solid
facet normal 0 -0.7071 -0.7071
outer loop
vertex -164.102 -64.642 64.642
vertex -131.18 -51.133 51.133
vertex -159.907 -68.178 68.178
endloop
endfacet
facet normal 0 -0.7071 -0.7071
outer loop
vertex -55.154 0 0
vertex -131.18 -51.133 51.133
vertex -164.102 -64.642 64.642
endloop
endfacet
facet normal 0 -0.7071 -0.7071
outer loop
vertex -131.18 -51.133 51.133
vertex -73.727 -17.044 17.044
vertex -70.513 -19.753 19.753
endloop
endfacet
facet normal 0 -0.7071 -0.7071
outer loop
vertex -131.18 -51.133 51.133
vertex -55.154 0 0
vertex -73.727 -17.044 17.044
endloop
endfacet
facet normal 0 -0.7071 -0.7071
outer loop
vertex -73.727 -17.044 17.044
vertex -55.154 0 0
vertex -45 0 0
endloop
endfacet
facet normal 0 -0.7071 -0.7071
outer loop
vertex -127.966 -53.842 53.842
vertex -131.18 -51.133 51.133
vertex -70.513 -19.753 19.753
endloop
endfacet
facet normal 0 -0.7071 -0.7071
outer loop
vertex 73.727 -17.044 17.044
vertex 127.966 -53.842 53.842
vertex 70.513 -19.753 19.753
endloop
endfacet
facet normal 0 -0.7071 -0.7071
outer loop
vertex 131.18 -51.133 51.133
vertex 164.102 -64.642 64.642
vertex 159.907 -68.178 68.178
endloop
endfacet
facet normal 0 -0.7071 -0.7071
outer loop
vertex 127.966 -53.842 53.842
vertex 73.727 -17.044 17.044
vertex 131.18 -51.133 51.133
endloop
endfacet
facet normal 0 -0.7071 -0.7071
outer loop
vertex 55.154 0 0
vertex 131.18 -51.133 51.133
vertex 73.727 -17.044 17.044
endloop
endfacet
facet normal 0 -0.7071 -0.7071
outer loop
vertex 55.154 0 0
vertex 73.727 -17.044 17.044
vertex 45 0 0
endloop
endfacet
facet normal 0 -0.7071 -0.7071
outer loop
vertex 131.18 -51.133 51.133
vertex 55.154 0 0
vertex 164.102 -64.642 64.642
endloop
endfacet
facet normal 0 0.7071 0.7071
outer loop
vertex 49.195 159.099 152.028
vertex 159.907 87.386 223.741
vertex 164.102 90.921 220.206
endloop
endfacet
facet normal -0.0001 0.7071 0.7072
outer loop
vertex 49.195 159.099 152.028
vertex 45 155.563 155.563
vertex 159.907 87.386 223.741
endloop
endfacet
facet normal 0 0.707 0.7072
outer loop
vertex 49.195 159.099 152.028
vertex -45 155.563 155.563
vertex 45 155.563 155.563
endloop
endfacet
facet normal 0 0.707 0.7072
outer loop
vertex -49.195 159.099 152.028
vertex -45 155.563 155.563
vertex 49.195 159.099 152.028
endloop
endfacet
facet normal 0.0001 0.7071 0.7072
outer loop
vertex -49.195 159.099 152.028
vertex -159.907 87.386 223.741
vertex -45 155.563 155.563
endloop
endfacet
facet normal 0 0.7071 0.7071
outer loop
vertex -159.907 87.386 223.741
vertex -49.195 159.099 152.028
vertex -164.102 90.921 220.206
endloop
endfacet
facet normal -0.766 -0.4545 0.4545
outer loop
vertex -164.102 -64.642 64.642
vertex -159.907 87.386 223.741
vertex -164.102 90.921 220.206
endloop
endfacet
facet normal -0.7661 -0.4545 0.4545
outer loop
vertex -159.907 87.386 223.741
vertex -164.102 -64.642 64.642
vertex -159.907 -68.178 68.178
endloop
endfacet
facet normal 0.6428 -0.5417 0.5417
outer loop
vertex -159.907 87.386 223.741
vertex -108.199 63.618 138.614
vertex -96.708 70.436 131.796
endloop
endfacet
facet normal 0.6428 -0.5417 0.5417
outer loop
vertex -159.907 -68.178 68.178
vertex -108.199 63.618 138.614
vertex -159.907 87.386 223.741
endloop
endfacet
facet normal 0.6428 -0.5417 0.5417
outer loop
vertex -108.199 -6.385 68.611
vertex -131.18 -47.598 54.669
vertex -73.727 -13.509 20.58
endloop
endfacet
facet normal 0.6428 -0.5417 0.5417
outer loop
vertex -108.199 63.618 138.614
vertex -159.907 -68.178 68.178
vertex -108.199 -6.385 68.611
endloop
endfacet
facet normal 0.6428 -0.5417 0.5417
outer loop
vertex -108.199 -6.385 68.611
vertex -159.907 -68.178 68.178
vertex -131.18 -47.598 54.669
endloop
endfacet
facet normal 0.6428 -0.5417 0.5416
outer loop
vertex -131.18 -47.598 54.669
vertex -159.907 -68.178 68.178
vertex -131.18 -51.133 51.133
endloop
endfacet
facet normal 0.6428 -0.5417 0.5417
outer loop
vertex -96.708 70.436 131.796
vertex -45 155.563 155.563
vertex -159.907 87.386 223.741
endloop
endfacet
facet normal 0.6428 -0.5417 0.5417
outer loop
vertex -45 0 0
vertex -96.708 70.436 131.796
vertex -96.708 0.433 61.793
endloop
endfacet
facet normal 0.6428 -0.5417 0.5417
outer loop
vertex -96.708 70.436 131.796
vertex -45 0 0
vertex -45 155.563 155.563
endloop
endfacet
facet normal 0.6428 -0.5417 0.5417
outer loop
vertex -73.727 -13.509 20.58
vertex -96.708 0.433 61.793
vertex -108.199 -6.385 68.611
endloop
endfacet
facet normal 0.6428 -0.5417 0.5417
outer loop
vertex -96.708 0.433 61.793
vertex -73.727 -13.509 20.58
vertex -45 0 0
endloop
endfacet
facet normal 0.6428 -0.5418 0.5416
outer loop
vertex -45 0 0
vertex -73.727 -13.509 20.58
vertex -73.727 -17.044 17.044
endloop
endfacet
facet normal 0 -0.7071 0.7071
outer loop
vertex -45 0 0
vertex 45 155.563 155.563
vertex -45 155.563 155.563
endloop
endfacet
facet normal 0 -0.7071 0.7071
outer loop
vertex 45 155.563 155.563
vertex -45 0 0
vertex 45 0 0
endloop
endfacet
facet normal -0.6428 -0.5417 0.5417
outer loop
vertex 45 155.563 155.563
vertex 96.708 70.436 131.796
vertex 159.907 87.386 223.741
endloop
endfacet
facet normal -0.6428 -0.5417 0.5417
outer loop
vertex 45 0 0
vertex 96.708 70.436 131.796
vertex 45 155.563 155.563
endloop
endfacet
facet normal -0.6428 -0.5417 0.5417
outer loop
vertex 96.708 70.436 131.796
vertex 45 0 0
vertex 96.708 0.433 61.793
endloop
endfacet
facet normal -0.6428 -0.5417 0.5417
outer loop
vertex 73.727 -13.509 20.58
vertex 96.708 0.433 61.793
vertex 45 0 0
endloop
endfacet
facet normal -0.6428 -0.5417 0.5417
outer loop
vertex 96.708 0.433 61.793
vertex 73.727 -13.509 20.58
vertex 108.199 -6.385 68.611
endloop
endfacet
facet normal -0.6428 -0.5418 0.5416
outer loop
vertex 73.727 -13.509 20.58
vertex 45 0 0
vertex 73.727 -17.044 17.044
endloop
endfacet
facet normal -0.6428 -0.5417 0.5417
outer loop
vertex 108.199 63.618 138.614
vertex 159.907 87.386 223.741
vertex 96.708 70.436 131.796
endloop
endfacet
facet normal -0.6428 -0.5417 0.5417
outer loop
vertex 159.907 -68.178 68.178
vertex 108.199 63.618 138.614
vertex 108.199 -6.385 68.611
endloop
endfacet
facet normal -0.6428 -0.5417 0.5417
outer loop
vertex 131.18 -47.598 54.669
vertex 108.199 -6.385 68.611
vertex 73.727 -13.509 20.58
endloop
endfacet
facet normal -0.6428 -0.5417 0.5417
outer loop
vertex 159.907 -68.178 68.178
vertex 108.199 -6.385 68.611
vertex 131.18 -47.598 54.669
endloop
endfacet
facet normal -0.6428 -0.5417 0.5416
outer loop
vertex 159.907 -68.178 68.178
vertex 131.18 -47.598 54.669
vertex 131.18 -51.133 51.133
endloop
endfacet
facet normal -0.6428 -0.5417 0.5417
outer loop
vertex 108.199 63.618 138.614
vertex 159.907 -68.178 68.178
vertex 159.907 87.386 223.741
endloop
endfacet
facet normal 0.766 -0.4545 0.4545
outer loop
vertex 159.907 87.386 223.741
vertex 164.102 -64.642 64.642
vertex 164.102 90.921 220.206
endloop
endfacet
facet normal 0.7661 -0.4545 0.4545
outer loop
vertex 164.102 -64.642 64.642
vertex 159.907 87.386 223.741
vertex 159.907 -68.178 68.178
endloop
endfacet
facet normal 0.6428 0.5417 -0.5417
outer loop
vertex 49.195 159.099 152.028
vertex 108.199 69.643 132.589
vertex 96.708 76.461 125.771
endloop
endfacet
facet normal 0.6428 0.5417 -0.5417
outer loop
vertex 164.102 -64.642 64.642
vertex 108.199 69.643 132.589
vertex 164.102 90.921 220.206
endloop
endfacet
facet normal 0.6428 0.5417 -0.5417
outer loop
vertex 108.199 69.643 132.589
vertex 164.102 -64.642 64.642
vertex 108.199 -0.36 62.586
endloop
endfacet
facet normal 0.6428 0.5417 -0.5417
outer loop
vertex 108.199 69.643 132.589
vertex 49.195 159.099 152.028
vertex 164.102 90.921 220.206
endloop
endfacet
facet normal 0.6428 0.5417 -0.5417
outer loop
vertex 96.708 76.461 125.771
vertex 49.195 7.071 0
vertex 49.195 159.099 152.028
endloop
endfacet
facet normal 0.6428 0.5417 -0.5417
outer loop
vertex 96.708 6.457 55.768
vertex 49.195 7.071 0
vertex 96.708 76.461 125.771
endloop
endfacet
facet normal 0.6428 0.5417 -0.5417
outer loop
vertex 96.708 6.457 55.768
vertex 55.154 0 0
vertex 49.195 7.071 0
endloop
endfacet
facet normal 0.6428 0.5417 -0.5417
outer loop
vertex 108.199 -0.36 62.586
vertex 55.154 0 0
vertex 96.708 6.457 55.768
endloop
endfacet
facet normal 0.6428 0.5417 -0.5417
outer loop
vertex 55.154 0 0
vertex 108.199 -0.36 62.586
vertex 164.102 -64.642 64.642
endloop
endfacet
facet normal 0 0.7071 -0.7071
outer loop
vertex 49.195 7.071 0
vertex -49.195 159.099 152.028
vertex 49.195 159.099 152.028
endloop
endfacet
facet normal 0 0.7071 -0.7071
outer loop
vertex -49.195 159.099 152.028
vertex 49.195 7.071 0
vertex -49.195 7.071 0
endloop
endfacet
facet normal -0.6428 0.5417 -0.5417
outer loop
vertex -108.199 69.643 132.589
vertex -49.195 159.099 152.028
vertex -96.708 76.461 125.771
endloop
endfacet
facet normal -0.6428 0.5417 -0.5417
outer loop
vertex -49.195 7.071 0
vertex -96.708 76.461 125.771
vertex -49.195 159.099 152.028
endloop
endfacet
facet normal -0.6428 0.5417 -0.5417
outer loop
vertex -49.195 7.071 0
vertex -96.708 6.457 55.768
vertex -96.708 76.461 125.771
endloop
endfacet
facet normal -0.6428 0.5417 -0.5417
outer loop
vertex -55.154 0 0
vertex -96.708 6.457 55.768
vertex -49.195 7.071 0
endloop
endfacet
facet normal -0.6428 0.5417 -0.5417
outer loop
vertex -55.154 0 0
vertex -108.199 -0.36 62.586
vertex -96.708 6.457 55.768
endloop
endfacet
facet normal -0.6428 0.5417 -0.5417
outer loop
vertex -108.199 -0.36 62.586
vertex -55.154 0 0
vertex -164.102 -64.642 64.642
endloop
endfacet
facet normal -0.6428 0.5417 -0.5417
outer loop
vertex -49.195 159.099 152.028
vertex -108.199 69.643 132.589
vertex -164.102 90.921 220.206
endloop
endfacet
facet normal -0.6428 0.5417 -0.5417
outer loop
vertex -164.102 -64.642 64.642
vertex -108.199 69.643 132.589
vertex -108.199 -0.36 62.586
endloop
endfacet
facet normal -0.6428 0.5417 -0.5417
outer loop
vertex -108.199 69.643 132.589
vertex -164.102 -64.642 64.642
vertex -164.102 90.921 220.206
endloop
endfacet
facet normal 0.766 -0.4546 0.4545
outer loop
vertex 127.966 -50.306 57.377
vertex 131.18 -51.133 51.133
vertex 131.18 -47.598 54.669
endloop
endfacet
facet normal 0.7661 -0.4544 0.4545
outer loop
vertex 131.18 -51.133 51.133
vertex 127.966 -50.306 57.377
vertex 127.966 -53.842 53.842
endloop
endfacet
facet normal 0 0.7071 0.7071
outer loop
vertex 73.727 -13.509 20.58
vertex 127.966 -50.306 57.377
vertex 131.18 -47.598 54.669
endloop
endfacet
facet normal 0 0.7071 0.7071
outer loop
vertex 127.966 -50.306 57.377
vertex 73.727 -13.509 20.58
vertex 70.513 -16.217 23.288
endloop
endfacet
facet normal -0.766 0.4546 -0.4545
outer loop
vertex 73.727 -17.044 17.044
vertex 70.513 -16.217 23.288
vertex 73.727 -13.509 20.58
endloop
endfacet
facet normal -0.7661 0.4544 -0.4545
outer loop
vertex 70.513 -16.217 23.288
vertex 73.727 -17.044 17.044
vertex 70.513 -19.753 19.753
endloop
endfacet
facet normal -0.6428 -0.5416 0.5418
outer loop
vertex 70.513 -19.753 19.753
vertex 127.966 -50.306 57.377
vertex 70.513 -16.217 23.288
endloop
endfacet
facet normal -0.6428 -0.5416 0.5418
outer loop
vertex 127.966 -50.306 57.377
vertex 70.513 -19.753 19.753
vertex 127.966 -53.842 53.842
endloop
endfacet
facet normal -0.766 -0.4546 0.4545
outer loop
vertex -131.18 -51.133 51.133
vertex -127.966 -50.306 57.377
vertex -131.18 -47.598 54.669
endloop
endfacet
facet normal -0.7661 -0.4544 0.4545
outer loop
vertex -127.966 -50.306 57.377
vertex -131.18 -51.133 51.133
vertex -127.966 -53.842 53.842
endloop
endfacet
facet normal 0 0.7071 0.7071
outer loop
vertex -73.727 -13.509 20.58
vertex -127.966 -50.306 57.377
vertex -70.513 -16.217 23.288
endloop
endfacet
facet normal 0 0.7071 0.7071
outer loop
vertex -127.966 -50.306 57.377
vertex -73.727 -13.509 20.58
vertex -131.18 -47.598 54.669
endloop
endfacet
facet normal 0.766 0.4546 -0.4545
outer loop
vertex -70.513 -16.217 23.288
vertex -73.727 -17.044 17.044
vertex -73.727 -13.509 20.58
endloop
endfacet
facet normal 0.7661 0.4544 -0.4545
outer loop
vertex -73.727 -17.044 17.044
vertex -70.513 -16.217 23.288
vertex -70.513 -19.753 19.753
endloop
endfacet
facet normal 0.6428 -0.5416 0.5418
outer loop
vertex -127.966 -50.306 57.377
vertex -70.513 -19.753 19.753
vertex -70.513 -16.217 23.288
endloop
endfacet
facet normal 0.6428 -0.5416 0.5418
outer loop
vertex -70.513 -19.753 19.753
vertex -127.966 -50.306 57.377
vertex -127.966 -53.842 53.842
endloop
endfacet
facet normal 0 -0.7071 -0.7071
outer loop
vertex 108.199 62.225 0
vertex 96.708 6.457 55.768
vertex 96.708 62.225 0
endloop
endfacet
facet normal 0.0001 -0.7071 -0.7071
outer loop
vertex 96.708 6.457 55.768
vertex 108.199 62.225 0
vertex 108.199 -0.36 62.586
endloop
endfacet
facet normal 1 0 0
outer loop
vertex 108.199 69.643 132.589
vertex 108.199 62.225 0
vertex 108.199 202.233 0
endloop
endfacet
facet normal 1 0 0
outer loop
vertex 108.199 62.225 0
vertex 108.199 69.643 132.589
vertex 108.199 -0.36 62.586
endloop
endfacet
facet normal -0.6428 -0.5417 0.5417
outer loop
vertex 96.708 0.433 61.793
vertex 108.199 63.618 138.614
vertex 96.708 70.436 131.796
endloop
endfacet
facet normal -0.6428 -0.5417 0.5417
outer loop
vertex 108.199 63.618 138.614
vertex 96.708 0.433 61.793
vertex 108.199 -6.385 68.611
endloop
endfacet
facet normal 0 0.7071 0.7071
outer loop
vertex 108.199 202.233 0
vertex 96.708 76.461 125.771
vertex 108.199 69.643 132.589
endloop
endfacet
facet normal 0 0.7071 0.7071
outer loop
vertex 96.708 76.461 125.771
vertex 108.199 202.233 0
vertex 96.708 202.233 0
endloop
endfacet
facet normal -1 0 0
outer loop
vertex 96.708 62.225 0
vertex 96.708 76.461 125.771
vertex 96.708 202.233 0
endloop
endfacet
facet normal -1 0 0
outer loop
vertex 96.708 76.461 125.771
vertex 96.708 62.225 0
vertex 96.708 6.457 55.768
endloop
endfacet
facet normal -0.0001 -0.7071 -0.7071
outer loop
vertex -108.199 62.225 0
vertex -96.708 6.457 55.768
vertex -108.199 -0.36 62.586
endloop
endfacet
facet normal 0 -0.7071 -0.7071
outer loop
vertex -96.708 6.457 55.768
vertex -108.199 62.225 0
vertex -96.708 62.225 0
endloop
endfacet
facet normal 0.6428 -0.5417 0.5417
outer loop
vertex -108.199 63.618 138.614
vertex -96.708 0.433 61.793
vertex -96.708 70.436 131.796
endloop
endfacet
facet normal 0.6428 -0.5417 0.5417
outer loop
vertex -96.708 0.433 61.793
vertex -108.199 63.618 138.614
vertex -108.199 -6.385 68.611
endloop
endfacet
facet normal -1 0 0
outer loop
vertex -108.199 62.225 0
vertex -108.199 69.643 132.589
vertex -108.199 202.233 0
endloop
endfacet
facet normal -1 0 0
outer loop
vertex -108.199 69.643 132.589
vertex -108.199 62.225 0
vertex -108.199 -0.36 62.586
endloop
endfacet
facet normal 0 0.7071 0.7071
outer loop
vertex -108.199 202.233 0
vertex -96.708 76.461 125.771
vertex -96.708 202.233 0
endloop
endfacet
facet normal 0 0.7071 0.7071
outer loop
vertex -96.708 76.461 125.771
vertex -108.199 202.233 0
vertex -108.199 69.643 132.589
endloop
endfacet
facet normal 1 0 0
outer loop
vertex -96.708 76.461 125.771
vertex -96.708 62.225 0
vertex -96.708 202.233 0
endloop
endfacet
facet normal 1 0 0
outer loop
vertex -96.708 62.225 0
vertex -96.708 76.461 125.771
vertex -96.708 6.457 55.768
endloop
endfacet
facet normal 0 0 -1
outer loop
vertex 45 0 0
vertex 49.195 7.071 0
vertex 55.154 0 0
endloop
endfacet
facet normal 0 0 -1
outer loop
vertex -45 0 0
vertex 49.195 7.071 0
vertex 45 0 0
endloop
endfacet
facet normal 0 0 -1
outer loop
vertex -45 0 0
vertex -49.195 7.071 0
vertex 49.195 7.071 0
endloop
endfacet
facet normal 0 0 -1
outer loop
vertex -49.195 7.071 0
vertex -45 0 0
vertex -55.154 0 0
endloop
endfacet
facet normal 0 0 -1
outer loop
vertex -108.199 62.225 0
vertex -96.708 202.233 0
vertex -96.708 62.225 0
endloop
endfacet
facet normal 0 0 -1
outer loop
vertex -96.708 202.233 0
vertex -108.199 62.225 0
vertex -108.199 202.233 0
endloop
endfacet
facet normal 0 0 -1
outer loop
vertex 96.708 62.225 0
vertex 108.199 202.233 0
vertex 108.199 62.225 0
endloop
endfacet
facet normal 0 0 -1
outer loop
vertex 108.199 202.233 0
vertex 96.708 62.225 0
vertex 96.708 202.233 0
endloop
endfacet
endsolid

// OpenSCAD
//Bookstand created by Sara Gonzalez, University of Florida.  All dimensions are in mm and angles in degrees.



//Width of book spine in mm
width = 90; 
//Width of book cover (single side) in mm
cover = 150; 
//Height of book in mm
bookheight = 220;  

//Angle that book is open on stand, measured from horizontal, 90 deg is closed, 0 deg is fully open
openang = 40; // [0:85]
//Angle that book is leaning back, measured from vertical
repose = 45; //[10:85]
//Thickness of model
thickness = 5; 



ledgex = cover/2;  //xyz dimensions of book ledge
//Thickness and length of bookcover ledge (do not change)
ledgey = 10;
ledgez = 5;
A=width;
B=cover;
C=thickness;
D=width + 2*(thickness/tan(90-openang));
reposeht = bookheight*sin(repose)*sin(repose);

//calculate legs points
ptx0347 = .45*cover*cos(openang) + .5*width;
ptx1256 = .55*cover*cos(openang) + .5*width;
pty2367 = bookheight;
pty04 = -.45*cover*sin(openang);
pty15 = -.55*cover*sin(openang);
ptz0123 = .2*bookheight;
ptz4567 = .65*bookheight;

polypoints = [
    [ptx0347,pty04,ptz0123],
    [ptx1256,pty15,ptz0123], 
    [ptx1256,pty2367,ptz0123], 
    [ptx0347,pty2367,ptz0123], 
    [ptx0347,pty04,ptz4567], 
    [ptx1256,pty15,ptz4567], 
    [ptx1256,pty2367,ptz4567], 
    [ptx0347,pty2367,ptz4567]];

polyfaces = [
  [0,1,2,3],  // bottom
  [4,5,1,0],  // front
  [7,6,5,4],  // top
  [5,6,2,1],  // right
  [6,7,3,2],  // back
  [7,4,0,3]]; // left
      
difference(){
rotate([-repose,0,0]){   
    
        linear_extrude(height=bookheight){
                polygon(points = [ [0,0], [0,C], [D/2,C], [D/2 + B*cos(openang), C-B*sin(openang) ], [A/2 + B*cos(openang), -B*sin(openang)], [A/2, 0] ]);
                mirror([0])   
                polygon(points = [ [0,0], [0,C], [D/2,C], [D/2 + B*cos(openang), C-B*sin(openang) ], [A/2 + B*cos(openang), -B*sin(openang)], [A/2, 0] ]);}
        
        
        translate([A/2+(B/2)*cos(openang),-(B/2)*sin(openang), ledgez/2]){ rotate(-openang) cube([ledgex, ledgey, ledgez], center=true);}
        
        mirror([0]){translate([A/2+(B/2)*cos(openang),-(B/2)*sin(openang), ledgez/2]){ rotate(-openang) cube([ledgex, ledgey, ledgez], center=true);}}
        
        
        polyhedron( polypoints, polyfaces);
        
        mirror([0])
            polyhedron( polypoints, polyfaces);
    
}
//Slice z<0 material
translate([-cover-.5*width, -.5*bookheight, -bookheight]){
    cube(size = [2*cover+width,2*bookheight,bookheight]);}
}
